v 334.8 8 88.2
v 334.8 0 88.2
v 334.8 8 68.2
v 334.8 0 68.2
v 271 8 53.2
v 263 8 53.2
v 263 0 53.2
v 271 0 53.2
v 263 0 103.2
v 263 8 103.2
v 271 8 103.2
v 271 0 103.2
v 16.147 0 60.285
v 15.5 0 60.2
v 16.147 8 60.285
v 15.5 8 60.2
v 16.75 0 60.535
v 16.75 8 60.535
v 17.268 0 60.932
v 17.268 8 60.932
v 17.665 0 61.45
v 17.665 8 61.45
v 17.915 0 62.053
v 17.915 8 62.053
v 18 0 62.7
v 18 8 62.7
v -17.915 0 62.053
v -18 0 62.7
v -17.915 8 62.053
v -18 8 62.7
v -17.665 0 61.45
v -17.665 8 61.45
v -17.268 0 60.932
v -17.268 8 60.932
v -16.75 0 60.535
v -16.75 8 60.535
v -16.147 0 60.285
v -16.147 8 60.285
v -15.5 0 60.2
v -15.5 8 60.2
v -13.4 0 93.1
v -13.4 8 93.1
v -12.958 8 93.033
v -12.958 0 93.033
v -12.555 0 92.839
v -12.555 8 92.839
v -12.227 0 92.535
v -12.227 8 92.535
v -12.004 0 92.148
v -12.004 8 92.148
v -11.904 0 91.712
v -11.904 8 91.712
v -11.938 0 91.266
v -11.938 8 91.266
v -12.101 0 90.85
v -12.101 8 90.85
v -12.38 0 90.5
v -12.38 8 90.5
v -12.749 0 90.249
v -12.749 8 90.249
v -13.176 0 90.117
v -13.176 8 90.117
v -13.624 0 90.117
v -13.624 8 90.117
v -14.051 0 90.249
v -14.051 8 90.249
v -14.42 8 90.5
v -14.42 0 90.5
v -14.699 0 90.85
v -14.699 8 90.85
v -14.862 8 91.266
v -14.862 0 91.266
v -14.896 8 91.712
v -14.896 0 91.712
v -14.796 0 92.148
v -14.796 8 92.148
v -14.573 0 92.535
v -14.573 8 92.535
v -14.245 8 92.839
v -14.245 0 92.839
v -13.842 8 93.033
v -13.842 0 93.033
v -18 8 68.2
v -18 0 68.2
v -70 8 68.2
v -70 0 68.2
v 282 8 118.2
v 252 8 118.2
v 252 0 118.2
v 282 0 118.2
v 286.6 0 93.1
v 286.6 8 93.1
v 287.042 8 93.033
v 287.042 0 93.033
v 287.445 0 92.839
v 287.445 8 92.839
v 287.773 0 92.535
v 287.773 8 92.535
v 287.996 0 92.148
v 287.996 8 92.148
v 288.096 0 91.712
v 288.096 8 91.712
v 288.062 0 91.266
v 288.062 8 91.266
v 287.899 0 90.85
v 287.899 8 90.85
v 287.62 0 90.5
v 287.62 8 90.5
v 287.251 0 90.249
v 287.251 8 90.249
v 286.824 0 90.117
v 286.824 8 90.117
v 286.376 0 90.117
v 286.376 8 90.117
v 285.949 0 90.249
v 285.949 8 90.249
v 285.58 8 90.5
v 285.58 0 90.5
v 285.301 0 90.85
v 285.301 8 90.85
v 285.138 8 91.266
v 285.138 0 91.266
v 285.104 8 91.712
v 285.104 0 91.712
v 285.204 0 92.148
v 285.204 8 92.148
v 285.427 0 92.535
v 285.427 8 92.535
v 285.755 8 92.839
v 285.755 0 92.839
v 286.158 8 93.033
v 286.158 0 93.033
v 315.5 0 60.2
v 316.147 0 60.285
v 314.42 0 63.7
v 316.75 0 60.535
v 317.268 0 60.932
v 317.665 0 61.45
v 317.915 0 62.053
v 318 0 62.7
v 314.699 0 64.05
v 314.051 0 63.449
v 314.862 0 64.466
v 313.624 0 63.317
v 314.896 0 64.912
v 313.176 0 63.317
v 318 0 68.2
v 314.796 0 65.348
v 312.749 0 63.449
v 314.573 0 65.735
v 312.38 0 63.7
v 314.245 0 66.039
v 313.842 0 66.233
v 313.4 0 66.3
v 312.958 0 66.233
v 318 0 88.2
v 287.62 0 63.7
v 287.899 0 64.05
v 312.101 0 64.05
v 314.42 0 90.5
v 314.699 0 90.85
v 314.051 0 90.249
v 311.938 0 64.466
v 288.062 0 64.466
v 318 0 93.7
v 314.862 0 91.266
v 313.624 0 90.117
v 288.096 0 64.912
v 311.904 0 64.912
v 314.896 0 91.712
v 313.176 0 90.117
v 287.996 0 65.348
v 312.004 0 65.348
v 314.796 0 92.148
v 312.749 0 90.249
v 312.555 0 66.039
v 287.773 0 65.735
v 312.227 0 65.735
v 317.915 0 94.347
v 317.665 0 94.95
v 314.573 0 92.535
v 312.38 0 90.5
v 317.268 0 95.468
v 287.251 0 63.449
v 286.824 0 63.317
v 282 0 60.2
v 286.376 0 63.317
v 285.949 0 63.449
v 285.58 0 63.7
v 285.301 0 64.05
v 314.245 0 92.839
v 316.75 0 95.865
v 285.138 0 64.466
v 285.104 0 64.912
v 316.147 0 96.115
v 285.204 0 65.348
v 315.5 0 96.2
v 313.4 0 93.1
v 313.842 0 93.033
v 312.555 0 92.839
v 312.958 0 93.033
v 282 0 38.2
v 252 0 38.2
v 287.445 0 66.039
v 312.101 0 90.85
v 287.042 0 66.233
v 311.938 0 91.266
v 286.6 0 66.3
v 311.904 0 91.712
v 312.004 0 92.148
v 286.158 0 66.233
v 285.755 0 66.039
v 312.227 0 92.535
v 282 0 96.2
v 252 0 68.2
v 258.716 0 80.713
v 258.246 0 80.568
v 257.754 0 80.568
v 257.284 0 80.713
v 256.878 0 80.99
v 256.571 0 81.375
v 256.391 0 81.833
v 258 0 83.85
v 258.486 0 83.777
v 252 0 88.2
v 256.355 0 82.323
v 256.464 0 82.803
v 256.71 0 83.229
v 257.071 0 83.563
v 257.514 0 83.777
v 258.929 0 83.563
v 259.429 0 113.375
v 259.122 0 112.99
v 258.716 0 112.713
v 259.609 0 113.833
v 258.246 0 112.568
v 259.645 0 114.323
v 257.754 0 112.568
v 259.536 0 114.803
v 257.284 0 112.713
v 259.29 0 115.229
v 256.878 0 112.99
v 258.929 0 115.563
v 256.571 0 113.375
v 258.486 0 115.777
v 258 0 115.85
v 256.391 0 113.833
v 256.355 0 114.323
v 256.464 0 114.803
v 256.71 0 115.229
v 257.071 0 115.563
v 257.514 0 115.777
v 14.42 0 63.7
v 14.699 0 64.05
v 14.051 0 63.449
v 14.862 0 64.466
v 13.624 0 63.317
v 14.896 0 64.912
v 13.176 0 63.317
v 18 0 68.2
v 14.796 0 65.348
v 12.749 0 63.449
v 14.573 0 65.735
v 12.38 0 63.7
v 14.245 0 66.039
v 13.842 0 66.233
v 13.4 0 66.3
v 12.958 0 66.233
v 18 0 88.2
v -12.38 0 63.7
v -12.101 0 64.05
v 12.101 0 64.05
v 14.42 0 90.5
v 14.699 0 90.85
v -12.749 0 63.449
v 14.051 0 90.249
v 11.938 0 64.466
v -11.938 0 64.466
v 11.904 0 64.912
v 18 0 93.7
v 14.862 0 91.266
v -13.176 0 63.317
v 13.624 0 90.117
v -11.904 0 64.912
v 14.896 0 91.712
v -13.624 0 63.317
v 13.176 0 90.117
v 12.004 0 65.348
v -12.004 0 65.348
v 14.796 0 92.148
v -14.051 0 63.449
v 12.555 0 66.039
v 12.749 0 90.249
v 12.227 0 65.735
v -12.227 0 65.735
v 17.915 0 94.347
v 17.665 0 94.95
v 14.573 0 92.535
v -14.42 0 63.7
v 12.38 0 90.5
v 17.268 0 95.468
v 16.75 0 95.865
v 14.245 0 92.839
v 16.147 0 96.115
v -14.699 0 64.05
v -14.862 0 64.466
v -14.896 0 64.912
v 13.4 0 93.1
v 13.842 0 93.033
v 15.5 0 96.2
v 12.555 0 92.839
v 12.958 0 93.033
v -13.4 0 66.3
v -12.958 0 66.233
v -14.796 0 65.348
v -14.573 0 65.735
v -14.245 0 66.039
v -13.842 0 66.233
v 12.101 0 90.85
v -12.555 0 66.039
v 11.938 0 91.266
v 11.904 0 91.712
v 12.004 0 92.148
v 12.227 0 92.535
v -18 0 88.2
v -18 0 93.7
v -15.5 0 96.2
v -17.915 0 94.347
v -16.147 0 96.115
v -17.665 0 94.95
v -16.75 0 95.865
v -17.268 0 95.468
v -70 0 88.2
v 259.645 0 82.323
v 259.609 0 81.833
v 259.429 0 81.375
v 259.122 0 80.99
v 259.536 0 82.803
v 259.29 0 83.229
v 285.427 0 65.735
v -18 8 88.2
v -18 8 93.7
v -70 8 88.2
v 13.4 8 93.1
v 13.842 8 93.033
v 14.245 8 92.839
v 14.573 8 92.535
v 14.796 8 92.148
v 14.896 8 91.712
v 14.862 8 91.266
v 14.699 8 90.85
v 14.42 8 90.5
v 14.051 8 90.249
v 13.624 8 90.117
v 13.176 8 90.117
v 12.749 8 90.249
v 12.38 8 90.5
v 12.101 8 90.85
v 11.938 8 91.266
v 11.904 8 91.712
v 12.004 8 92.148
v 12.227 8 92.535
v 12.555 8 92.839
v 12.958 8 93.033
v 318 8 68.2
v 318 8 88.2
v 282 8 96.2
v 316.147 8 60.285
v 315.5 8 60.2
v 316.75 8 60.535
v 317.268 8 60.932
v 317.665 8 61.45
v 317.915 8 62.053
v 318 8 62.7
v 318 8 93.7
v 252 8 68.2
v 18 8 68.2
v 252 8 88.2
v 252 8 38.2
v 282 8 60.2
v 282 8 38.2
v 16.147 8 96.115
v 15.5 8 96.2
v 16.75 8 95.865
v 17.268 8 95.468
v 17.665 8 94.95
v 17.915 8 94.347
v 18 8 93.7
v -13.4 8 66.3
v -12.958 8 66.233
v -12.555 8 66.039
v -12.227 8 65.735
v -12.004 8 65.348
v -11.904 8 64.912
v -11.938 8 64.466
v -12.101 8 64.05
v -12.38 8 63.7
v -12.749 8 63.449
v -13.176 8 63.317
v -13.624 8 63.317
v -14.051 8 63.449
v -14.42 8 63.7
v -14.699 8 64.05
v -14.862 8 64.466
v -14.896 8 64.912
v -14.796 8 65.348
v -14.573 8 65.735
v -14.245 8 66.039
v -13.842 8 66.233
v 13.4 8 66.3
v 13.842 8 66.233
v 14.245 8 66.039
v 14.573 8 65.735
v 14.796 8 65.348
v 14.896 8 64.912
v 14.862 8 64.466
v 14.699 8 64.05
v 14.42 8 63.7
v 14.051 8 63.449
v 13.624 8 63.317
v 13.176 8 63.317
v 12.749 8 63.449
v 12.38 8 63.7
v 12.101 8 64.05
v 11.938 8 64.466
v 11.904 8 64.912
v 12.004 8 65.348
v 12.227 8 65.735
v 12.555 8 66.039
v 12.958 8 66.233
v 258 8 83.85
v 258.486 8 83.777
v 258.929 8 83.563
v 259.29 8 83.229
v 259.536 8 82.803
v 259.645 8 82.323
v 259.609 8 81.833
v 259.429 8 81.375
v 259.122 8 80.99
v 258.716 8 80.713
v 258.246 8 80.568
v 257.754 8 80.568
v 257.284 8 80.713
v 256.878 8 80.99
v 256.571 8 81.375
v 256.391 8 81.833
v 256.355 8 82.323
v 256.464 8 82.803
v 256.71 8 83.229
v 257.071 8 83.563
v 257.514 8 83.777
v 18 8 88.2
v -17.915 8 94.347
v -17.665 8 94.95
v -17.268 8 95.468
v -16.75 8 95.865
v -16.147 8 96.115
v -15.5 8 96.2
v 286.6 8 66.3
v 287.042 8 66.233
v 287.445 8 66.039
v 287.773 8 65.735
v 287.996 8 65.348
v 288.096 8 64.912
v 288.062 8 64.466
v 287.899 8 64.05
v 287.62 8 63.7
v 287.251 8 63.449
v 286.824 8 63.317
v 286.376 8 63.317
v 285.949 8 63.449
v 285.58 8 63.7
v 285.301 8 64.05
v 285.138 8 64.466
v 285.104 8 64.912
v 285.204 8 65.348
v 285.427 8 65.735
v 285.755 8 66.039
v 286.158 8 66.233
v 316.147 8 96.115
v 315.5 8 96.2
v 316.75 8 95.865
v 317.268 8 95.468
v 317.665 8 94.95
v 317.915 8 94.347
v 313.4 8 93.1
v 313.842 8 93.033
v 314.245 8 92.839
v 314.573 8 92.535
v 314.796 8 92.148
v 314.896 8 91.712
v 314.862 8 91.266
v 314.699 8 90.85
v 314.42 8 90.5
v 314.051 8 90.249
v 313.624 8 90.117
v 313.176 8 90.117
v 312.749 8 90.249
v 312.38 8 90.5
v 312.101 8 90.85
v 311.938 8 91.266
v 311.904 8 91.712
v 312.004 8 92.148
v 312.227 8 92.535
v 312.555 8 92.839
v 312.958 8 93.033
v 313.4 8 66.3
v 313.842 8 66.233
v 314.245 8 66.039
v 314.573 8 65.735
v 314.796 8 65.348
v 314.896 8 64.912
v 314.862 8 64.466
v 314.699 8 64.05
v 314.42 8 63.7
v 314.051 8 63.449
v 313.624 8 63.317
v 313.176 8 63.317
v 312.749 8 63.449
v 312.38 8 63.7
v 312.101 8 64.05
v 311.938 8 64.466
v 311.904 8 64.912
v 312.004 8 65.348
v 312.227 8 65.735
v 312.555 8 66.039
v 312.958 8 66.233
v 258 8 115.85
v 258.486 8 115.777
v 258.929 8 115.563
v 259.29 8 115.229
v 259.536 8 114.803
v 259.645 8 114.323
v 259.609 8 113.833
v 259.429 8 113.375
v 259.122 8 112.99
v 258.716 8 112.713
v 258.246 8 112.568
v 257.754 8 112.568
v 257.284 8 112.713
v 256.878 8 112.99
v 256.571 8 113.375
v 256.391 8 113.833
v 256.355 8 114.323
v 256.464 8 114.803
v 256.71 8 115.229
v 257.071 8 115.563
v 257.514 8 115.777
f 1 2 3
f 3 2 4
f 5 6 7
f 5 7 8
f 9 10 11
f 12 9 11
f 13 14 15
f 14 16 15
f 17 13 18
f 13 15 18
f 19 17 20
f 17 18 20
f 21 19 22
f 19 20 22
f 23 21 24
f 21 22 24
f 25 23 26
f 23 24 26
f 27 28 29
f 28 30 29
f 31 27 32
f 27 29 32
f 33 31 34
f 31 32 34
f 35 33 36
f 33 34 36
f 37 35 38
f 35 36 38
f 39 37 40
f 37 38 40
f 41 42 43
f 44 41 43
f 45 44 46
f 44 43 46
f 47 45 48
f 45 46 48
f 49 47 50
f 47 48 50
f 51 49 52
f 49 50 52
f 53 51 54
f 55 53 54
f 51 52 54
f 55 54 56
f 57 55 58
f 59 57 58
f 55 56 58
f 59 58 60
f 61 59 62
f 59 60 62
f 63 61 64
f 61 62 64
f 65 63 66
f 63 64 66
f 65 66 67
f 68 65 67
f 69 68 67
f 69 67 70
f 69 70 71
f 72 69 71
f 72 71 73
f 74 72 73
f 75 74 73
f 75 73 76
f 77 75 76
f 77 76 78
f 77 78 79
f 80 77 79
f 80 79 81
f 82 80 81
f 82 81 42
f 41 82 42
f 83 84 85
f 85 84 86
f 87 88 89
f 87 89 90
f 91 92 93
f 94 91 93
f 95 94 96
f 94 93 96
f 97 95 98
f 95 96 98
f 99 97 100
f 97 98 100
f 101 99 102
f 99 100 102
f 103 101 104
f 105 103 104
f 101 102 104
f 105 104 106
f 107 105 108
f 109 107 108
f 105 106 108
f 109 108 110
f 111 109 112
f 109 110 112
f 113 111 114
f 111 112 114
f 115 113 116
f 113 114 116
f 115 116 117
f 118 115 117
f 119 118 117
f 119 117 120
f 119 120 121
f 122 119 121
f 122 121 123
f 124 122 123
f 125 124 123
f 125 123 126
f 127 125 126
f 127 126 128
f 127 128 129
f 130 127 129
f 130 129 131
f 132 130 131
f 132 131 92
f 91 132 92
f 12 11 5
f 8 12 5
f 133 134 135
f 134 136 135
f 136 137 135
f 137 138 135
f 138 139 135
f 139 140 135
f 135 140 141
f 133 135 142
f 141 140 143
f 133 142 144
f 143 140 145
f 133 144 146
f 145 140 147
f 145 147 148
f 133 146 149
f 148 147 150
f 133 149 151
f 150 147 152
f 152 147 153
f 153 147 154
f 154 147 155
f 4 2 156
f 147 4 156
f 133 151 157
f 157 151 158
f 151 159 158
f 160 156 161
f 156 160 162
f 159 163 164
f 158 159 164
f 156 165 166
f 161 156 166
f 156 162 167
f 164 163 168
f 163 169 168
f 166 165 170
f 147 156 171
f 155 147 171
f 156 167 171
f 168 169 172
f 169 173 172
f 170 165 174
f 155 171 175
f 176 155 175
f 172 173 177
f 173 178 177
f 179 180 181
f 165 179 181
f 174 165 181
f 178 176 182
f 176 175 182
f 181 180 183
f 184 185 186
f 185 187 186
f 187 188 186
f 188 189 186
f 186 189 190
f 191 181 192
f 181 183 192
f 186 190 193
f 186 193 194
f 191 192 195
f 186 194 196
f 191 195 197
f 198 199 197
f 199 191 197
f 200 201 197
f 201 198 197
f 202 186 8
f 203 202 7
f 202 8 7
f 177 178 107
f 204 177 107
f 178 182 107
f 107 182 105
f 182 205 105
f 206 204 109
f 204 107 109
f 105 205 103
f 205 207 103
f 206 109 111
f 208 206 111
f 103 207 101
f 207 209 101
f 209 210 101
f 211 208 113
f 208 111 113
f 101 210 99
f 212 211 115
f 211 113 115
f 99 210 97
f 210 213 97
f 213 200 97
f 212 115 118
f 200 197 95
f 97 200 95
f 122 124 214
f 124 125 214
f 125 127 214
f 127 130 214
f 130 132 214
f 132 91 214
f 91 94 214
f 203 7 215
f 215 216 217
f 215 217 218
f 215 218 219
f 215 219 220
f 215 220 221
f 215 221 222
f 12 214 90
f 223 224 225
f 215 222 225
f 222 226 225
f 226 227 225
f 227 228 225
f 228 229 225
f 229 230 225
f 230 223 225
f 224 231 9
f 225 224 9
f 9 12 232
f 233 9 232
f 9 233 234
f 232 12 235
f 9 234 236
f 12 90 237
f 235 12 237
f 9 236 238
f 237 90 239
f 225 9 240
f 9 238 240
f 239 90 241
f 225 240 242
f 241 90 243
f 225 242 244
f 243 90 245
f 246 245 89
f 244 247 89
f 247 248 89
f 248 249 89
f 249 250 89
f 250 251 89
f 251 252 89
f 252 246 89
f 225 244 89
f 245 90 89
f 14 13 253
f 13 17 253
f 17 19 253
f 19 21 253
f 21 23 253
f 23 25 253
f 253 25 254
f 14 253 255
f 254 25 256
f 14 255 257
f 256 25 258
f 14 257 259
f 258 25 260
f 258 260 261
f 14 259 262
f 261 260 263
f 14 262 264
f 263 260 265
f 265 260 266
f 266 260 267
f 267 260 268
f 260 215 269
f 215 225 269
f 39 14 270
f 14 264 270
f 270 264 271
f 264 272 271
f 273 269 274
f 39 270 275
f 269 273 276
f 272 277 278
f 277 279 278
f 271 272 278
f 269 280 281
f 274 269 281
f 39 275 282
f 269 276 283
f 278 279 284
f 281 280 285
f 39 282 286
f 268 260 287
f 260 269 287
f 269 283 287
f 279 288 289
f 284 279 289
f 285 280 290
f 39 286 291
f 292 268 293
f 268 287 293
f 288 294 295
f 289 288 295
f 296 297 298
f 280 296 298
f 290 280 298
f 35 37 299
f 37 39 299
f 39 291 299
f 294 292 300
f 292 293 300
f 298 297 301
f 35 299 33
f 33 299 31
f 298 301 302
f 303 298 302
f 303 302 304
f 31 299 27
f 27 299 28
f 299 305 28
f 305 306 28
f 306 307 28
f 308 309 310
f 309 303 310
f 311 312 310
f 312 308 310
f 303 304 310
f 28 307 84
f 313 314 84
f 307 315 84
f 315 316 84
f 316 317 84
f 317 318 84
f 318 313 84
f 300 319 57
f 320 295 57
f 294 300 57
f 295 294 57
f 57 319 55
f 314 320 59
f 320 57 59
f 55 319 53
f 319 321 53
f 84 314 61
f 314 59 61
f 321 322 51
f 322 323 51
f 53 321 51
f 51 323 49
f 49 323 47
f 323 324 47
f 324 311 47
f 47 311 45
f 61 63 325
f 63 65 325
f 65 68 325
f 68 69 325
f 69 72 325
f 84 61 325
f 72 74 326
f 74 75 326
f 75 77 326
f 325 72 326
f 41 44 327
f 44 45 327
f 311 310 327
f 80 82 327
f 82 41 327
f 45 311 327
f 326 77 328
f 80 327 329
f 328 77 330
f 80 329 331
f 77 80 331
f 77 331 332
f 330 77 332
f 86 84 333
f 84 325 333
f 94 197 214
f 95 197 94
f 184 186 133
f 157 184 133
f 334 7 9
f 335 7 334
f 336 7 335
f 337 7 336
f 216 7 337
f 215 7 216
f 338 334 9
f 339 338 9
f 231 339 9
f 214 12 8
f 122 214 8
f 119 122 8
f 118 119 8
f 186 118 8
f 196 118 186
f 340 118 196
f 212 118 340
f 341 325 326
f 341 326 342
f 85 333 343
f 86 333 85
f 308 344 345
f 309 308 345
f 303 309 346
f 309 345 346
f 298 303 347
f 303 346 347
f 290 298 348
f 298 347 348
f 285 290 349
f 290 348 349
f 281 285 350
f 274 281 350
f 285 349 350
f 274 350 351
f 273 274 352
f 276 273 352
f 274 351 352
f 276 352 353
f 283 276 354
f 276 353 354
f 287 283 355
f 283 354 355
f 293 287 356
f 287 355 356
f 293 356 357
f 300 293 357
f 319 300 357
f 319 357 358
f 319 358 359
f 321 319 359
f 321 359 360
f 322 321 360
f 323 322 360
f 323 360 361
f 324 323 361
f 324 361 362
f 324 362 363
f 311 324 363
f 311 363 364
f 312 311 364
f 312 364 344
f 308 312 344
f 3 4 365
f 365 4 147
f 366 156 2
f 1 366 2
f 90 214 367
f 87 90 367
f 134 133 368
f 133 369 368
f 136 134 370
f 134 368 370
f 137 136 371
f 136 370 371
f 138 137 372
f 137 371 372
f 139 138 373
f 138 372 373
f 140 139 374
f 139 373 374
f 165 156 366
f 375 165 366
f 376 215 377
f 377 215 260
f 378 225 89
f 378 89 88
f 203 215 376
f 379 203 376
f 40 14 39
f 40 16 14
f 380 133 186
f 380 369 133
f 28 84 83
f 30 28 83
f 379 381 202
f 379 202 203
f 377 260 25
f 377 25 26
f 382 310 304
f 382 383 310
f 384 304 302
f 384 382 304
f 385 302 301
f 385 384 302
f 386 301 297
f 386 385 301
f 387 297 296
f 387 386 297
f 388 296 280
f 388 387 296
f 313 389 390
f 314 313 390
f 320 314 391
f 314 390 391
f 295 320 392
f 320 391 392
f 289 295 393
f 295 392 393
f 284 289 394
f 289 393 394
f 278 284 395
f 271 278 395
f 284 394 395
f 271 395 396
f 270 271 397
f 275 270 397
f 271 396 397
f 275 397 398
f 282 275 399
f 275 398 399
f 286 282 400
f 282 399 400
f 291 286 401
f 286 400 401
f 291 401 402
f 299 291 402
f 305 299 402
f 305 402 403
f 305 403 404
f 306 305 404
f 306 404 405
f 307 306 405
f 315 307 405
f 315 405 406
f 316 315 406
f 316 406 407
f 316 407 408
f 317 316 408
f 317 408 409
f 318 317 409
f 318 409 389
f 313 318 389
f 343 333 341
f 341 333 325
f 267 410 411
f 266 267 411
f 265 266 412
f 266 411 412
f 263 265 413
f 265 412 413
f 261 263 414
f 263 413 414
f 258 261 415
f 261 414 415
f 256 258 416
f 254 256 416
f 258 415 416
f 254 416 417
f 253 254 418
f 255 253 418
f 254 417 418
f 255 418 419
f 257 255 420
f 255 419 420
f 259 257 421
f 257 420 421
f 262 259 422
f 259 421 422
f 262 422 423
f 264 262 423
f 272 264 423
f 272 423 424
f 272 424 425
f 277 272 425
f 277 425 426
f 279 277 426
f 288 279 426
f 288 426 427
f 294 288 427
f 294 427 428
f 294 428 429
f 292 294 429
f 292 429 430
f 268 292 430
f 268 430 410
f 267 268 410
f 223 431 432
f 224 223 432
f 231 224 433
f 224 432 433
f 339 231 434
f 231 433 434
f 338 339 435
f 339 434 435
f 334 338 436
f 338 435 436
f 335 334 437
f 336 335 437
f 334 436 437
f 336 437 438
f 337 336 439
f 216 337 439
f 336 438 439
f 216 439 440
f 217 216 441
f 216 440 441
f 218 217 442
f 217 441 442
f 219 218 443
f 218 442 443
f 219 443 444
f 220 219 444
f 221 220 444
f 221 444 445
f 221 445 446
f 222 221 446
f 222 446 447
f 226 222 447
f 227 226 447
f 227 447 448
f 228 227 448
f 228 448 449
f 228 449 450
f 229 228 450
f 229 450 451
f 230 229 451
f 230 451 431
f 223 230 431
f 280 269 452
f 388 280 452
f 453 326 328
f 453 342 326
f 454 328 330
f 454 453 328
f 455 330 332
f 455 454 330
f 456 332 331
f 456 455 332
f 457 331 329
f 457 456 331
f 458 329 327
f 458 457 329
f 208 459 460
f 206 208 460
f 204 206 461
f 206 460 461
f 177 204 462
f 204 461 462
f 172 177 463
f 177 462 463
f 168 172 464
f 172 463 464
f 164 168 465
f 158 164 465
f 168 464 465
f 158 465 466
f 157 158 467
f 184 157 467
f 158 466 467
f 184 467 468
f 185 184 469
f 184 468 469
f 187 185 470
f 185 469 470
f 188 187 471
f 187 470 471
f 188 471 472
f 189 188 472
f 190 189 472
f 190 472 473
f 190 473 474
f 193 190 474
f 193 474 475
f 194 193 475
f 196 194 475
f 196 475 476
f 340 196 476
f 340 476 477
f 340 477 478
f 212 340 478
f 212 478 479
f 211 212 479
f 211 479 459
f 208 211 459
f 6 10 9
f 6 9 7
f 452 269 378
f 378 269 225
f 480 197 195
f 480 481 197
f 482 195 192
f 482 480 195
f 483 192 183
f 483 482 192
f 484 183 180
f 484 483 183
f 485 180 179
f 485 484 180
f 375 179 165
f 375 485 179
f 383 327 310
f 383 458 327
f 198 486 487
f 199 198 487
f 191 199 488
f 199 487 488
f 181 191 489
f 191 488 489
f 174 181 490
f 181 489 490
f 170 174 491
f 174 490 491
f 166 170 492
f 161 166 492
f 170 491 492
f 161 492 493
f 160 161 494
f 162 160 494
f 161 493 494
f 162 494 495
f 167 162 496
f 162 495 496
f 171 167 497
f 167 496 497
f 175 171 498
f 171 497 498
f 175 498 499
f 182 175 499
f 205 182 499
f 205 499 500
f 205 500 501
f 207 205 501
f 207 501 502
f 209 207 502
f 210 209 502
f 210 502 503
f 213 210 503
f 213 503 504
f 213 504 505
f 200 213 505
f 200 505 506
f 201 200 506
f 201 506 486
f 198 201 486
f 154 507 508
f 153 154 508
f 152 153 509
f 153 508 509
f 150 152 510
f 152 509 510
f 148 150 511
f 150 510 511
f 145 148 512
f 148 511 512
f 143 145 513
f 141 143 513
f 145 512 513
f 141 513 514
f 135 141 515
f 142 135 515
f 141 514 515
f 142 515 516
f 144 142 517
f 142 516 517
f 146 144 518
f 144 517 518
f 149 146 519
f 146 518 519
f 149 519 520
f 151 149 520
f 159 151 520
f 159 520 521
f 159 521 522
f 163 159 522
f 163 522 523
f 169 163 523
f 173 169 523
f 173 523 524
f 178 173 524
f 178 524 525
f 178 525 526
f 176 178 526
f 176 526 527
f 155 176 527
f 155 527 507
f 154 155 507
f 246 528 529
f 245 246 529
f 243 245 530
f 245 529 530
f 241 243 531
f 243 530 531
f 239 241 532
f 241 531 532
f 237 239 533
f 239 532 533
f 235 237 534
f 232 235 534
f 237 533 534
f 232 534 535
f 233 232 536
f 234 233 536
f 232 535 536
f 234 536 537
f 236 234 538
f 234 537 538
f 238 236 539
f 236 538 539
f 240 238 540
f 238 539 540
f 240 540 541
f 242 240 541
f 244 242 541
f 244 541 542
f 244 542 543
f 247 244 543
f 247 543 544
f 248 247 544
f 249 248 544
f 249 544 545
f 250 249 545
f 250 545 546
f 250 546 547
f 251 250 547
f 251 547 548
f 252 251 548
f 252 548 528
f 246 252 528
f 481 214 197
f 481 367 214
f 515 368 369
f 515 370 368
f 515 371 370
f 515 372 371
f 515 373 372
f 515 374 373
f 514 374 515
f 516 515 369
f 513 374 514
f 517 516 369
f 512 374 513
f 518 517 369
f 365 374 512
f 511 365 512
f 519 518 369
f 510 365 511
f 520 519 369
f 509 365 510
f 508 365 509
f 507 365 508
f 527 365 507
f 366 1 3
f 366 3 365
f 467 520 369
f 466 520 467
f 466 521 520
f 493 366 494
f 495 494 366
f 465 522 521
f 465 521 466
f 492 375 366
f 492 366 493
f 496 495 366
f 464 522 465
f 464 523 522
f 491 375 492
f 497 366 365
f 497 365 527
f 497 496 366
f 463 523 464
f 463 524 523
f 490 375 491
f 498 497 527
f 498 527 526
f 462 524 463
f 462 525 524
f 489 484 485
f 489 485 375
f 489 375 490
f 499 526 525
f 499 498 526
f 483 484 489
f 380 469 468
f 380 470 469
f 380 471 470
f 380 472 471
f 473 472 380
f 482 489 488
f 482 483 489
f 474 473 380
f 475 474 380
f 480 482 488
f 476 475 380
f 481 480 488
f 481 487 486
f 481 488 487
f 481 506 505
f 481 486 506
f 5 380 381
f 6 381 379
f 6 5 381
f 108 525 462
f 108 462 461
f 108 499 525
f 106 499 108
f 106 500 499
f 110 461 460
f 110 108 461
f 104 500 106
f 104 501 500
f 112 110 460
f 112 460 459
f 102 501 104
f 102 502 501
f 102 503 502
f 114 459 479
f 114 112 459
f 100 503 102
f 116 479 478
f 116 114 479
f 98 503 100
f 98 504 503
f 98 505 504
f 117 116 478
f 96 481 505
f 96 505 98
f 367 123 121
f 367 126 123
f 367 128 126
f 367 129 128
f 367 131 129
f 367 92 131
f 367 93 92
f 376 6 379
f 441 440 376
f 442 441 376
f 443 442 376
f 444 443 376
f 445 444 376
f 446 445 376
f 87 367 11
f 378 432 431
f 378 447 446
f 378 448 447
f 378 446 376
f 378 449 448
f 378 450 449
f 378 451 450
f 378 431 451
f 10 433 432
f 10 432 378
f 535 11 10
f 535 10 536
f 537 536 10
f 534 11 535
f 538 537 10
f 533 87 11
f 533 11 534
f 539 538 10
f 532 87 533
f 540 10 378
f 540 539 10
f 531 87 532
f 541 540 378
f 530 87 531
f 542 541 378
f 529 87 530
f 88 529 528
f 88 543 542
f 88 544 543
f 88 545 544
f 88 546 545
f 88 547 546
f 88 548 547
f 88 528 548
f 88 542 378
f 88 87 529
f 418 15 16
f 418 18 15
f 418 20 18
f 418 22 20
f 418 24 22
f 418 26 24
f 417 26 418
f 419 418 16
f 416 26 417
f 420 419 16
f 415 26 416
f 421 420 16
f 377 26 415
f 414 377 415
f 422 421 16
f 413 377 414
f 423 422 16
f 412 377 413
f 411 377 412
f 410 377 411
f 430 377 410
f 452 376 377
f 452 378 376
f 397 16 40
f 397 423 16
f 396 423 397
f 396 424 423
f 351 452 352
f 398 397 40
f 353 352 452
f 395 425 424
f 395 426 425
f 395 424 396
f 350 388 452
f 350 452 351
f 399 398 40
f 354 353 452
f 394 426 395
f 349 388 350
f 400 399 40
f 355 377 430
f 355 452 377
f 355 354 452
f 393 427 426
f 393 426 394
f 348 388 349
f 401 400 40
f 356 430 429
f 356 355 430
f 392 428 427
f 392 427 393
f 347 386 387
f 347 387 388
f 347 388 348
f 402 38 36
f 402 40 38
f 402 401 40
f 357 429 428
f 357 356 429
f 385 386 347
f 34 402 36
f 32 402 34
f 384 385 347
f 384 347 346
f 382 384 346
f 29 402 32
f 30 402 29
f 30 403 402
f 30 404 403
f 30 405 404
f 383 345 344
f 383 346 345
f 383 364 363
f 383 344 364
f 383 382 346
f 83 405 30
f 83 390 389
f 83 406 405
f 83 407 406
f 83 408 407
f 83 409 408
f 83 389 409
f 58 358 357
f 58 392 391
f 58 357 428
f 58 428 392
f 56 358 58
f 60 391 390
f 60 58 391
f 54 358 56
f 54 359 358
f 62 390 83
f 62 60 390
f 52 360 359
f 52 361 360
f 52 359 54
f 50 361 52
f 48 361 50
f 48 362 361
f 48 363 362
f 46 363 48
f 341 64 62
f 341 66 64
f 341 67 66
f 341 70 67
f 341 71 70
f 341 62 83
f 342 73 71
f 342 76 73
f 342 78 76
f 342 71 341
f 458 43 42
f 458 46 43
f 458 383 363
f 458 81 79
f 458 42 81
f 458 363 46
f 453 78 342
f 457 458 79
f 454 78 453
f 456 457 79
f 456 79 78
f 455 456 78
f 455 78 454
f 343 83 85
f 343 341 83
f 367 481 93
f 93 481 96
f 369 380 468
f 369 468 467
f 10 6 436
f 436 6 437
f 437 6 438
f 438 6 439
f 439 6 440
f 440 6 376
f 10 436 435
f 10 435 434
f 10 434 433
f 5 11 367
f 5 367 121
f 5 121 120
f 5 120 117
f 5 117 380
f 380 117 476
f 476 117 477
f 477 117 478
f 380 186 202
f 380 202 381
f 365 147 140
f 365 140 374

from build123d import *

# Parameters (mm, degrees)
SKETCH1_W           = 70
SKETCH1_H           = 20
SKETCH1_W_2         = 264.8
EXTRUDE_931_DEPTH   = 8
SKETCH2_W           = 36
SKETCH2_H           = 8
BOSS_EXTRUDE2_DEPTH = 8
SKETCH4_W           = 36
SKETCH4_H           = 8
BOSS_EXTRUDE3_DEPTH = 8
SKETCH5_R           = 1.5
CUT_EXTRUDE1_DEPTH  = 349.438631613
FILLET1_R           = 2.5
SKETCH6_W           = 30
SKETCH6_H           = 8
BOSS_EXTRUDE4_DEPTH = 30
SKETCH7_W           = 30
SKETCH7_H           = 8
BOSS_EXTRUDE5_DEPTH = 30
SKETCH8_W           = 8
SKETCH8_H           = 50
CUT_EXTRUDE2_DEPTH  = 356.142619239
SKETCH11_R          = 1.65
CUT_EXTRUDE3_DEPTH  = 356.142619239


with BuildPart() as part:
    # Sketch1 → Extrude 931 (new body)
    with BuildSketch(Plane(origin=(0, 0, 0), x_dir=(1, 0, 0), z_dir=(0, 1, 0))):
        with Locations((-35, -78.2)):
            Rectangle(SKETCH1_W, SKETCH1_H)
        with Locations((132.4, -78.2)):
            Rectangle(SKETCH1_W_2, SKETCH1_H)
        with Locations((299.8, -78.2)):
            Rectangle(SKETCH1_W, SKETCH1_H)
    extrude(amount=EXTRUDE_931_DEPTH)

    # Sketch2 → Boss-Extrude2 (add)
    with BuildSketch(Plane(origin=(0, 0, 68.2), x_dir=(-1, 0, 0), z_dir=(0, 0, -1))):
        with Locations((0, 4)):
            Rectangle(SKETCH2_W, SKETCH2_H)
        with Locations((-300, 4)):
            Rectangle(SKETCH2_W, SKETCH2_H)
    extrude(amount=BOSS_EXTRUDE2_DEPTH)

    # Sketch4 → Boss-Extrude3 (add)
    with BuildSketch(Plane.XY.offset(88.2)):
        with Locations((0, 4)):
            Rectangle(SKETCH4_W, SKETCH4_H)
        with Locations((300, 4)):
            Rectangle(SKETCH4_W, SKETCH4_H)
    extrude(amount=BOSS_EXTRUDE3_DEPTH)

    # Sketch5 → Cut-Extrude1 (cut, through all)
    with BuildSketch(Plane(origin=(0, 8, 0), x_dir=(1, 0, 0), z_dir=(0, 1, 0))):
        with Locations(Location((-13.4, -91.6, 0), (0, 0, 270))):
            Circle(SKETCH5_R)
        with Locations(Location((13.4, -91.6, 0), (0, 0, 270))):
            Circle(SKETCH5_R)
        with Locations(Location((13.4, -64.8, 0), (0, 0, 270))):
            Circle(SKETCH5_R)
        with Locations(Location((-13.4, -64.8, 0), (0, 0, 270))):
            Circle(SKETCH5_R)
        with Locations(Location((313.4, -91.6, 0), (0, 0, 270))):
            Circle(SKETCH5_R)
        with Locations(Location((286.6, -64.8, 0), (0, 0, 270))):
            Circle(SKETCH5_R)
        with Locations(Location((313.4, -64.8, 0), (0, 0, 270))):
            Circle(SKETCH5_R)
        with Locations(Location((286.6, -91.6, 0), (0, 0, 270))):
            Circle(SKETCH5_R)
    extrude(amount=-CUT_EXTRUDE1_DEPTH, mode=Mode.SUBTRACT)

    # Fillet1
    fillet1_edges = [part.edges().sort_by_distance(p)[0] for p in [
        (-18, 4, 60.2),
        (18, 4, 60.2),
        (318, 4, 60.2),
        (18, 4, 96.2),
        (-18, 4, 96.2),
        (318, 4, 96.2),
    ]]
    fillet(fillet1_edges, radius=FILLET1_R)

    # Sketch6 → Boss-Extrude4 (add)
    with BuildSketch(Plane.XY.offset(88.2)):
        with Locations((267, 4)):
            Rectangle(SKETCH6_W, SKETCH6_H)
    extrude(amount=BOSS_EXTRUDE4_DEPTH)

    # Sketch7 → Boss-Extrude5 (add)
    with BuildSketch(Plane(origin=(0, 0, 68.2), x_dir=(-1, 0, 0), z_dir=(0, 0, -1))):
        with Locations((-267, 4)):
            Rectangle(SKETCH7_W, SKETCH7_H)
    extrude(amount=BOSS_EXTRUDE5_DEPTH)

    # Sketch8 → Cut-Extrude2 (cut, through all)
    with BuildSketch(Plane(origin=(0, 8, 0), x_dir=(1, 0, 0), z_dir=(0, 1, 0))):
        with Locations((267, -78.2)):
            Rectangle(SKETCH8_W, SKETCH8_H)
    extrude(amount=-CUT_EXTRUDE2_DEPTH, mode=Mode.SUBTRACT)

    # Sketch11 → Cut-Extrude3 (cut, through all)
    with BuildSketch(Plane(origin=(0, 8, 0), x_dir=(1, 0, 0), z_dir=(0, 1, 0))):
        with Locations(Location((258, -114.2, 0), (0, 0, 270))):
            Circle(SKETCH11_R)
        with Locations(Location((258, -82.2, 0), (0, 0, 270))):
            Circle(SKETCH11_R)
    extrude(amount=-CUT_EXTRUDE3_DEPTH, mode=Mode.SUBTRACT)


solid = part.part
